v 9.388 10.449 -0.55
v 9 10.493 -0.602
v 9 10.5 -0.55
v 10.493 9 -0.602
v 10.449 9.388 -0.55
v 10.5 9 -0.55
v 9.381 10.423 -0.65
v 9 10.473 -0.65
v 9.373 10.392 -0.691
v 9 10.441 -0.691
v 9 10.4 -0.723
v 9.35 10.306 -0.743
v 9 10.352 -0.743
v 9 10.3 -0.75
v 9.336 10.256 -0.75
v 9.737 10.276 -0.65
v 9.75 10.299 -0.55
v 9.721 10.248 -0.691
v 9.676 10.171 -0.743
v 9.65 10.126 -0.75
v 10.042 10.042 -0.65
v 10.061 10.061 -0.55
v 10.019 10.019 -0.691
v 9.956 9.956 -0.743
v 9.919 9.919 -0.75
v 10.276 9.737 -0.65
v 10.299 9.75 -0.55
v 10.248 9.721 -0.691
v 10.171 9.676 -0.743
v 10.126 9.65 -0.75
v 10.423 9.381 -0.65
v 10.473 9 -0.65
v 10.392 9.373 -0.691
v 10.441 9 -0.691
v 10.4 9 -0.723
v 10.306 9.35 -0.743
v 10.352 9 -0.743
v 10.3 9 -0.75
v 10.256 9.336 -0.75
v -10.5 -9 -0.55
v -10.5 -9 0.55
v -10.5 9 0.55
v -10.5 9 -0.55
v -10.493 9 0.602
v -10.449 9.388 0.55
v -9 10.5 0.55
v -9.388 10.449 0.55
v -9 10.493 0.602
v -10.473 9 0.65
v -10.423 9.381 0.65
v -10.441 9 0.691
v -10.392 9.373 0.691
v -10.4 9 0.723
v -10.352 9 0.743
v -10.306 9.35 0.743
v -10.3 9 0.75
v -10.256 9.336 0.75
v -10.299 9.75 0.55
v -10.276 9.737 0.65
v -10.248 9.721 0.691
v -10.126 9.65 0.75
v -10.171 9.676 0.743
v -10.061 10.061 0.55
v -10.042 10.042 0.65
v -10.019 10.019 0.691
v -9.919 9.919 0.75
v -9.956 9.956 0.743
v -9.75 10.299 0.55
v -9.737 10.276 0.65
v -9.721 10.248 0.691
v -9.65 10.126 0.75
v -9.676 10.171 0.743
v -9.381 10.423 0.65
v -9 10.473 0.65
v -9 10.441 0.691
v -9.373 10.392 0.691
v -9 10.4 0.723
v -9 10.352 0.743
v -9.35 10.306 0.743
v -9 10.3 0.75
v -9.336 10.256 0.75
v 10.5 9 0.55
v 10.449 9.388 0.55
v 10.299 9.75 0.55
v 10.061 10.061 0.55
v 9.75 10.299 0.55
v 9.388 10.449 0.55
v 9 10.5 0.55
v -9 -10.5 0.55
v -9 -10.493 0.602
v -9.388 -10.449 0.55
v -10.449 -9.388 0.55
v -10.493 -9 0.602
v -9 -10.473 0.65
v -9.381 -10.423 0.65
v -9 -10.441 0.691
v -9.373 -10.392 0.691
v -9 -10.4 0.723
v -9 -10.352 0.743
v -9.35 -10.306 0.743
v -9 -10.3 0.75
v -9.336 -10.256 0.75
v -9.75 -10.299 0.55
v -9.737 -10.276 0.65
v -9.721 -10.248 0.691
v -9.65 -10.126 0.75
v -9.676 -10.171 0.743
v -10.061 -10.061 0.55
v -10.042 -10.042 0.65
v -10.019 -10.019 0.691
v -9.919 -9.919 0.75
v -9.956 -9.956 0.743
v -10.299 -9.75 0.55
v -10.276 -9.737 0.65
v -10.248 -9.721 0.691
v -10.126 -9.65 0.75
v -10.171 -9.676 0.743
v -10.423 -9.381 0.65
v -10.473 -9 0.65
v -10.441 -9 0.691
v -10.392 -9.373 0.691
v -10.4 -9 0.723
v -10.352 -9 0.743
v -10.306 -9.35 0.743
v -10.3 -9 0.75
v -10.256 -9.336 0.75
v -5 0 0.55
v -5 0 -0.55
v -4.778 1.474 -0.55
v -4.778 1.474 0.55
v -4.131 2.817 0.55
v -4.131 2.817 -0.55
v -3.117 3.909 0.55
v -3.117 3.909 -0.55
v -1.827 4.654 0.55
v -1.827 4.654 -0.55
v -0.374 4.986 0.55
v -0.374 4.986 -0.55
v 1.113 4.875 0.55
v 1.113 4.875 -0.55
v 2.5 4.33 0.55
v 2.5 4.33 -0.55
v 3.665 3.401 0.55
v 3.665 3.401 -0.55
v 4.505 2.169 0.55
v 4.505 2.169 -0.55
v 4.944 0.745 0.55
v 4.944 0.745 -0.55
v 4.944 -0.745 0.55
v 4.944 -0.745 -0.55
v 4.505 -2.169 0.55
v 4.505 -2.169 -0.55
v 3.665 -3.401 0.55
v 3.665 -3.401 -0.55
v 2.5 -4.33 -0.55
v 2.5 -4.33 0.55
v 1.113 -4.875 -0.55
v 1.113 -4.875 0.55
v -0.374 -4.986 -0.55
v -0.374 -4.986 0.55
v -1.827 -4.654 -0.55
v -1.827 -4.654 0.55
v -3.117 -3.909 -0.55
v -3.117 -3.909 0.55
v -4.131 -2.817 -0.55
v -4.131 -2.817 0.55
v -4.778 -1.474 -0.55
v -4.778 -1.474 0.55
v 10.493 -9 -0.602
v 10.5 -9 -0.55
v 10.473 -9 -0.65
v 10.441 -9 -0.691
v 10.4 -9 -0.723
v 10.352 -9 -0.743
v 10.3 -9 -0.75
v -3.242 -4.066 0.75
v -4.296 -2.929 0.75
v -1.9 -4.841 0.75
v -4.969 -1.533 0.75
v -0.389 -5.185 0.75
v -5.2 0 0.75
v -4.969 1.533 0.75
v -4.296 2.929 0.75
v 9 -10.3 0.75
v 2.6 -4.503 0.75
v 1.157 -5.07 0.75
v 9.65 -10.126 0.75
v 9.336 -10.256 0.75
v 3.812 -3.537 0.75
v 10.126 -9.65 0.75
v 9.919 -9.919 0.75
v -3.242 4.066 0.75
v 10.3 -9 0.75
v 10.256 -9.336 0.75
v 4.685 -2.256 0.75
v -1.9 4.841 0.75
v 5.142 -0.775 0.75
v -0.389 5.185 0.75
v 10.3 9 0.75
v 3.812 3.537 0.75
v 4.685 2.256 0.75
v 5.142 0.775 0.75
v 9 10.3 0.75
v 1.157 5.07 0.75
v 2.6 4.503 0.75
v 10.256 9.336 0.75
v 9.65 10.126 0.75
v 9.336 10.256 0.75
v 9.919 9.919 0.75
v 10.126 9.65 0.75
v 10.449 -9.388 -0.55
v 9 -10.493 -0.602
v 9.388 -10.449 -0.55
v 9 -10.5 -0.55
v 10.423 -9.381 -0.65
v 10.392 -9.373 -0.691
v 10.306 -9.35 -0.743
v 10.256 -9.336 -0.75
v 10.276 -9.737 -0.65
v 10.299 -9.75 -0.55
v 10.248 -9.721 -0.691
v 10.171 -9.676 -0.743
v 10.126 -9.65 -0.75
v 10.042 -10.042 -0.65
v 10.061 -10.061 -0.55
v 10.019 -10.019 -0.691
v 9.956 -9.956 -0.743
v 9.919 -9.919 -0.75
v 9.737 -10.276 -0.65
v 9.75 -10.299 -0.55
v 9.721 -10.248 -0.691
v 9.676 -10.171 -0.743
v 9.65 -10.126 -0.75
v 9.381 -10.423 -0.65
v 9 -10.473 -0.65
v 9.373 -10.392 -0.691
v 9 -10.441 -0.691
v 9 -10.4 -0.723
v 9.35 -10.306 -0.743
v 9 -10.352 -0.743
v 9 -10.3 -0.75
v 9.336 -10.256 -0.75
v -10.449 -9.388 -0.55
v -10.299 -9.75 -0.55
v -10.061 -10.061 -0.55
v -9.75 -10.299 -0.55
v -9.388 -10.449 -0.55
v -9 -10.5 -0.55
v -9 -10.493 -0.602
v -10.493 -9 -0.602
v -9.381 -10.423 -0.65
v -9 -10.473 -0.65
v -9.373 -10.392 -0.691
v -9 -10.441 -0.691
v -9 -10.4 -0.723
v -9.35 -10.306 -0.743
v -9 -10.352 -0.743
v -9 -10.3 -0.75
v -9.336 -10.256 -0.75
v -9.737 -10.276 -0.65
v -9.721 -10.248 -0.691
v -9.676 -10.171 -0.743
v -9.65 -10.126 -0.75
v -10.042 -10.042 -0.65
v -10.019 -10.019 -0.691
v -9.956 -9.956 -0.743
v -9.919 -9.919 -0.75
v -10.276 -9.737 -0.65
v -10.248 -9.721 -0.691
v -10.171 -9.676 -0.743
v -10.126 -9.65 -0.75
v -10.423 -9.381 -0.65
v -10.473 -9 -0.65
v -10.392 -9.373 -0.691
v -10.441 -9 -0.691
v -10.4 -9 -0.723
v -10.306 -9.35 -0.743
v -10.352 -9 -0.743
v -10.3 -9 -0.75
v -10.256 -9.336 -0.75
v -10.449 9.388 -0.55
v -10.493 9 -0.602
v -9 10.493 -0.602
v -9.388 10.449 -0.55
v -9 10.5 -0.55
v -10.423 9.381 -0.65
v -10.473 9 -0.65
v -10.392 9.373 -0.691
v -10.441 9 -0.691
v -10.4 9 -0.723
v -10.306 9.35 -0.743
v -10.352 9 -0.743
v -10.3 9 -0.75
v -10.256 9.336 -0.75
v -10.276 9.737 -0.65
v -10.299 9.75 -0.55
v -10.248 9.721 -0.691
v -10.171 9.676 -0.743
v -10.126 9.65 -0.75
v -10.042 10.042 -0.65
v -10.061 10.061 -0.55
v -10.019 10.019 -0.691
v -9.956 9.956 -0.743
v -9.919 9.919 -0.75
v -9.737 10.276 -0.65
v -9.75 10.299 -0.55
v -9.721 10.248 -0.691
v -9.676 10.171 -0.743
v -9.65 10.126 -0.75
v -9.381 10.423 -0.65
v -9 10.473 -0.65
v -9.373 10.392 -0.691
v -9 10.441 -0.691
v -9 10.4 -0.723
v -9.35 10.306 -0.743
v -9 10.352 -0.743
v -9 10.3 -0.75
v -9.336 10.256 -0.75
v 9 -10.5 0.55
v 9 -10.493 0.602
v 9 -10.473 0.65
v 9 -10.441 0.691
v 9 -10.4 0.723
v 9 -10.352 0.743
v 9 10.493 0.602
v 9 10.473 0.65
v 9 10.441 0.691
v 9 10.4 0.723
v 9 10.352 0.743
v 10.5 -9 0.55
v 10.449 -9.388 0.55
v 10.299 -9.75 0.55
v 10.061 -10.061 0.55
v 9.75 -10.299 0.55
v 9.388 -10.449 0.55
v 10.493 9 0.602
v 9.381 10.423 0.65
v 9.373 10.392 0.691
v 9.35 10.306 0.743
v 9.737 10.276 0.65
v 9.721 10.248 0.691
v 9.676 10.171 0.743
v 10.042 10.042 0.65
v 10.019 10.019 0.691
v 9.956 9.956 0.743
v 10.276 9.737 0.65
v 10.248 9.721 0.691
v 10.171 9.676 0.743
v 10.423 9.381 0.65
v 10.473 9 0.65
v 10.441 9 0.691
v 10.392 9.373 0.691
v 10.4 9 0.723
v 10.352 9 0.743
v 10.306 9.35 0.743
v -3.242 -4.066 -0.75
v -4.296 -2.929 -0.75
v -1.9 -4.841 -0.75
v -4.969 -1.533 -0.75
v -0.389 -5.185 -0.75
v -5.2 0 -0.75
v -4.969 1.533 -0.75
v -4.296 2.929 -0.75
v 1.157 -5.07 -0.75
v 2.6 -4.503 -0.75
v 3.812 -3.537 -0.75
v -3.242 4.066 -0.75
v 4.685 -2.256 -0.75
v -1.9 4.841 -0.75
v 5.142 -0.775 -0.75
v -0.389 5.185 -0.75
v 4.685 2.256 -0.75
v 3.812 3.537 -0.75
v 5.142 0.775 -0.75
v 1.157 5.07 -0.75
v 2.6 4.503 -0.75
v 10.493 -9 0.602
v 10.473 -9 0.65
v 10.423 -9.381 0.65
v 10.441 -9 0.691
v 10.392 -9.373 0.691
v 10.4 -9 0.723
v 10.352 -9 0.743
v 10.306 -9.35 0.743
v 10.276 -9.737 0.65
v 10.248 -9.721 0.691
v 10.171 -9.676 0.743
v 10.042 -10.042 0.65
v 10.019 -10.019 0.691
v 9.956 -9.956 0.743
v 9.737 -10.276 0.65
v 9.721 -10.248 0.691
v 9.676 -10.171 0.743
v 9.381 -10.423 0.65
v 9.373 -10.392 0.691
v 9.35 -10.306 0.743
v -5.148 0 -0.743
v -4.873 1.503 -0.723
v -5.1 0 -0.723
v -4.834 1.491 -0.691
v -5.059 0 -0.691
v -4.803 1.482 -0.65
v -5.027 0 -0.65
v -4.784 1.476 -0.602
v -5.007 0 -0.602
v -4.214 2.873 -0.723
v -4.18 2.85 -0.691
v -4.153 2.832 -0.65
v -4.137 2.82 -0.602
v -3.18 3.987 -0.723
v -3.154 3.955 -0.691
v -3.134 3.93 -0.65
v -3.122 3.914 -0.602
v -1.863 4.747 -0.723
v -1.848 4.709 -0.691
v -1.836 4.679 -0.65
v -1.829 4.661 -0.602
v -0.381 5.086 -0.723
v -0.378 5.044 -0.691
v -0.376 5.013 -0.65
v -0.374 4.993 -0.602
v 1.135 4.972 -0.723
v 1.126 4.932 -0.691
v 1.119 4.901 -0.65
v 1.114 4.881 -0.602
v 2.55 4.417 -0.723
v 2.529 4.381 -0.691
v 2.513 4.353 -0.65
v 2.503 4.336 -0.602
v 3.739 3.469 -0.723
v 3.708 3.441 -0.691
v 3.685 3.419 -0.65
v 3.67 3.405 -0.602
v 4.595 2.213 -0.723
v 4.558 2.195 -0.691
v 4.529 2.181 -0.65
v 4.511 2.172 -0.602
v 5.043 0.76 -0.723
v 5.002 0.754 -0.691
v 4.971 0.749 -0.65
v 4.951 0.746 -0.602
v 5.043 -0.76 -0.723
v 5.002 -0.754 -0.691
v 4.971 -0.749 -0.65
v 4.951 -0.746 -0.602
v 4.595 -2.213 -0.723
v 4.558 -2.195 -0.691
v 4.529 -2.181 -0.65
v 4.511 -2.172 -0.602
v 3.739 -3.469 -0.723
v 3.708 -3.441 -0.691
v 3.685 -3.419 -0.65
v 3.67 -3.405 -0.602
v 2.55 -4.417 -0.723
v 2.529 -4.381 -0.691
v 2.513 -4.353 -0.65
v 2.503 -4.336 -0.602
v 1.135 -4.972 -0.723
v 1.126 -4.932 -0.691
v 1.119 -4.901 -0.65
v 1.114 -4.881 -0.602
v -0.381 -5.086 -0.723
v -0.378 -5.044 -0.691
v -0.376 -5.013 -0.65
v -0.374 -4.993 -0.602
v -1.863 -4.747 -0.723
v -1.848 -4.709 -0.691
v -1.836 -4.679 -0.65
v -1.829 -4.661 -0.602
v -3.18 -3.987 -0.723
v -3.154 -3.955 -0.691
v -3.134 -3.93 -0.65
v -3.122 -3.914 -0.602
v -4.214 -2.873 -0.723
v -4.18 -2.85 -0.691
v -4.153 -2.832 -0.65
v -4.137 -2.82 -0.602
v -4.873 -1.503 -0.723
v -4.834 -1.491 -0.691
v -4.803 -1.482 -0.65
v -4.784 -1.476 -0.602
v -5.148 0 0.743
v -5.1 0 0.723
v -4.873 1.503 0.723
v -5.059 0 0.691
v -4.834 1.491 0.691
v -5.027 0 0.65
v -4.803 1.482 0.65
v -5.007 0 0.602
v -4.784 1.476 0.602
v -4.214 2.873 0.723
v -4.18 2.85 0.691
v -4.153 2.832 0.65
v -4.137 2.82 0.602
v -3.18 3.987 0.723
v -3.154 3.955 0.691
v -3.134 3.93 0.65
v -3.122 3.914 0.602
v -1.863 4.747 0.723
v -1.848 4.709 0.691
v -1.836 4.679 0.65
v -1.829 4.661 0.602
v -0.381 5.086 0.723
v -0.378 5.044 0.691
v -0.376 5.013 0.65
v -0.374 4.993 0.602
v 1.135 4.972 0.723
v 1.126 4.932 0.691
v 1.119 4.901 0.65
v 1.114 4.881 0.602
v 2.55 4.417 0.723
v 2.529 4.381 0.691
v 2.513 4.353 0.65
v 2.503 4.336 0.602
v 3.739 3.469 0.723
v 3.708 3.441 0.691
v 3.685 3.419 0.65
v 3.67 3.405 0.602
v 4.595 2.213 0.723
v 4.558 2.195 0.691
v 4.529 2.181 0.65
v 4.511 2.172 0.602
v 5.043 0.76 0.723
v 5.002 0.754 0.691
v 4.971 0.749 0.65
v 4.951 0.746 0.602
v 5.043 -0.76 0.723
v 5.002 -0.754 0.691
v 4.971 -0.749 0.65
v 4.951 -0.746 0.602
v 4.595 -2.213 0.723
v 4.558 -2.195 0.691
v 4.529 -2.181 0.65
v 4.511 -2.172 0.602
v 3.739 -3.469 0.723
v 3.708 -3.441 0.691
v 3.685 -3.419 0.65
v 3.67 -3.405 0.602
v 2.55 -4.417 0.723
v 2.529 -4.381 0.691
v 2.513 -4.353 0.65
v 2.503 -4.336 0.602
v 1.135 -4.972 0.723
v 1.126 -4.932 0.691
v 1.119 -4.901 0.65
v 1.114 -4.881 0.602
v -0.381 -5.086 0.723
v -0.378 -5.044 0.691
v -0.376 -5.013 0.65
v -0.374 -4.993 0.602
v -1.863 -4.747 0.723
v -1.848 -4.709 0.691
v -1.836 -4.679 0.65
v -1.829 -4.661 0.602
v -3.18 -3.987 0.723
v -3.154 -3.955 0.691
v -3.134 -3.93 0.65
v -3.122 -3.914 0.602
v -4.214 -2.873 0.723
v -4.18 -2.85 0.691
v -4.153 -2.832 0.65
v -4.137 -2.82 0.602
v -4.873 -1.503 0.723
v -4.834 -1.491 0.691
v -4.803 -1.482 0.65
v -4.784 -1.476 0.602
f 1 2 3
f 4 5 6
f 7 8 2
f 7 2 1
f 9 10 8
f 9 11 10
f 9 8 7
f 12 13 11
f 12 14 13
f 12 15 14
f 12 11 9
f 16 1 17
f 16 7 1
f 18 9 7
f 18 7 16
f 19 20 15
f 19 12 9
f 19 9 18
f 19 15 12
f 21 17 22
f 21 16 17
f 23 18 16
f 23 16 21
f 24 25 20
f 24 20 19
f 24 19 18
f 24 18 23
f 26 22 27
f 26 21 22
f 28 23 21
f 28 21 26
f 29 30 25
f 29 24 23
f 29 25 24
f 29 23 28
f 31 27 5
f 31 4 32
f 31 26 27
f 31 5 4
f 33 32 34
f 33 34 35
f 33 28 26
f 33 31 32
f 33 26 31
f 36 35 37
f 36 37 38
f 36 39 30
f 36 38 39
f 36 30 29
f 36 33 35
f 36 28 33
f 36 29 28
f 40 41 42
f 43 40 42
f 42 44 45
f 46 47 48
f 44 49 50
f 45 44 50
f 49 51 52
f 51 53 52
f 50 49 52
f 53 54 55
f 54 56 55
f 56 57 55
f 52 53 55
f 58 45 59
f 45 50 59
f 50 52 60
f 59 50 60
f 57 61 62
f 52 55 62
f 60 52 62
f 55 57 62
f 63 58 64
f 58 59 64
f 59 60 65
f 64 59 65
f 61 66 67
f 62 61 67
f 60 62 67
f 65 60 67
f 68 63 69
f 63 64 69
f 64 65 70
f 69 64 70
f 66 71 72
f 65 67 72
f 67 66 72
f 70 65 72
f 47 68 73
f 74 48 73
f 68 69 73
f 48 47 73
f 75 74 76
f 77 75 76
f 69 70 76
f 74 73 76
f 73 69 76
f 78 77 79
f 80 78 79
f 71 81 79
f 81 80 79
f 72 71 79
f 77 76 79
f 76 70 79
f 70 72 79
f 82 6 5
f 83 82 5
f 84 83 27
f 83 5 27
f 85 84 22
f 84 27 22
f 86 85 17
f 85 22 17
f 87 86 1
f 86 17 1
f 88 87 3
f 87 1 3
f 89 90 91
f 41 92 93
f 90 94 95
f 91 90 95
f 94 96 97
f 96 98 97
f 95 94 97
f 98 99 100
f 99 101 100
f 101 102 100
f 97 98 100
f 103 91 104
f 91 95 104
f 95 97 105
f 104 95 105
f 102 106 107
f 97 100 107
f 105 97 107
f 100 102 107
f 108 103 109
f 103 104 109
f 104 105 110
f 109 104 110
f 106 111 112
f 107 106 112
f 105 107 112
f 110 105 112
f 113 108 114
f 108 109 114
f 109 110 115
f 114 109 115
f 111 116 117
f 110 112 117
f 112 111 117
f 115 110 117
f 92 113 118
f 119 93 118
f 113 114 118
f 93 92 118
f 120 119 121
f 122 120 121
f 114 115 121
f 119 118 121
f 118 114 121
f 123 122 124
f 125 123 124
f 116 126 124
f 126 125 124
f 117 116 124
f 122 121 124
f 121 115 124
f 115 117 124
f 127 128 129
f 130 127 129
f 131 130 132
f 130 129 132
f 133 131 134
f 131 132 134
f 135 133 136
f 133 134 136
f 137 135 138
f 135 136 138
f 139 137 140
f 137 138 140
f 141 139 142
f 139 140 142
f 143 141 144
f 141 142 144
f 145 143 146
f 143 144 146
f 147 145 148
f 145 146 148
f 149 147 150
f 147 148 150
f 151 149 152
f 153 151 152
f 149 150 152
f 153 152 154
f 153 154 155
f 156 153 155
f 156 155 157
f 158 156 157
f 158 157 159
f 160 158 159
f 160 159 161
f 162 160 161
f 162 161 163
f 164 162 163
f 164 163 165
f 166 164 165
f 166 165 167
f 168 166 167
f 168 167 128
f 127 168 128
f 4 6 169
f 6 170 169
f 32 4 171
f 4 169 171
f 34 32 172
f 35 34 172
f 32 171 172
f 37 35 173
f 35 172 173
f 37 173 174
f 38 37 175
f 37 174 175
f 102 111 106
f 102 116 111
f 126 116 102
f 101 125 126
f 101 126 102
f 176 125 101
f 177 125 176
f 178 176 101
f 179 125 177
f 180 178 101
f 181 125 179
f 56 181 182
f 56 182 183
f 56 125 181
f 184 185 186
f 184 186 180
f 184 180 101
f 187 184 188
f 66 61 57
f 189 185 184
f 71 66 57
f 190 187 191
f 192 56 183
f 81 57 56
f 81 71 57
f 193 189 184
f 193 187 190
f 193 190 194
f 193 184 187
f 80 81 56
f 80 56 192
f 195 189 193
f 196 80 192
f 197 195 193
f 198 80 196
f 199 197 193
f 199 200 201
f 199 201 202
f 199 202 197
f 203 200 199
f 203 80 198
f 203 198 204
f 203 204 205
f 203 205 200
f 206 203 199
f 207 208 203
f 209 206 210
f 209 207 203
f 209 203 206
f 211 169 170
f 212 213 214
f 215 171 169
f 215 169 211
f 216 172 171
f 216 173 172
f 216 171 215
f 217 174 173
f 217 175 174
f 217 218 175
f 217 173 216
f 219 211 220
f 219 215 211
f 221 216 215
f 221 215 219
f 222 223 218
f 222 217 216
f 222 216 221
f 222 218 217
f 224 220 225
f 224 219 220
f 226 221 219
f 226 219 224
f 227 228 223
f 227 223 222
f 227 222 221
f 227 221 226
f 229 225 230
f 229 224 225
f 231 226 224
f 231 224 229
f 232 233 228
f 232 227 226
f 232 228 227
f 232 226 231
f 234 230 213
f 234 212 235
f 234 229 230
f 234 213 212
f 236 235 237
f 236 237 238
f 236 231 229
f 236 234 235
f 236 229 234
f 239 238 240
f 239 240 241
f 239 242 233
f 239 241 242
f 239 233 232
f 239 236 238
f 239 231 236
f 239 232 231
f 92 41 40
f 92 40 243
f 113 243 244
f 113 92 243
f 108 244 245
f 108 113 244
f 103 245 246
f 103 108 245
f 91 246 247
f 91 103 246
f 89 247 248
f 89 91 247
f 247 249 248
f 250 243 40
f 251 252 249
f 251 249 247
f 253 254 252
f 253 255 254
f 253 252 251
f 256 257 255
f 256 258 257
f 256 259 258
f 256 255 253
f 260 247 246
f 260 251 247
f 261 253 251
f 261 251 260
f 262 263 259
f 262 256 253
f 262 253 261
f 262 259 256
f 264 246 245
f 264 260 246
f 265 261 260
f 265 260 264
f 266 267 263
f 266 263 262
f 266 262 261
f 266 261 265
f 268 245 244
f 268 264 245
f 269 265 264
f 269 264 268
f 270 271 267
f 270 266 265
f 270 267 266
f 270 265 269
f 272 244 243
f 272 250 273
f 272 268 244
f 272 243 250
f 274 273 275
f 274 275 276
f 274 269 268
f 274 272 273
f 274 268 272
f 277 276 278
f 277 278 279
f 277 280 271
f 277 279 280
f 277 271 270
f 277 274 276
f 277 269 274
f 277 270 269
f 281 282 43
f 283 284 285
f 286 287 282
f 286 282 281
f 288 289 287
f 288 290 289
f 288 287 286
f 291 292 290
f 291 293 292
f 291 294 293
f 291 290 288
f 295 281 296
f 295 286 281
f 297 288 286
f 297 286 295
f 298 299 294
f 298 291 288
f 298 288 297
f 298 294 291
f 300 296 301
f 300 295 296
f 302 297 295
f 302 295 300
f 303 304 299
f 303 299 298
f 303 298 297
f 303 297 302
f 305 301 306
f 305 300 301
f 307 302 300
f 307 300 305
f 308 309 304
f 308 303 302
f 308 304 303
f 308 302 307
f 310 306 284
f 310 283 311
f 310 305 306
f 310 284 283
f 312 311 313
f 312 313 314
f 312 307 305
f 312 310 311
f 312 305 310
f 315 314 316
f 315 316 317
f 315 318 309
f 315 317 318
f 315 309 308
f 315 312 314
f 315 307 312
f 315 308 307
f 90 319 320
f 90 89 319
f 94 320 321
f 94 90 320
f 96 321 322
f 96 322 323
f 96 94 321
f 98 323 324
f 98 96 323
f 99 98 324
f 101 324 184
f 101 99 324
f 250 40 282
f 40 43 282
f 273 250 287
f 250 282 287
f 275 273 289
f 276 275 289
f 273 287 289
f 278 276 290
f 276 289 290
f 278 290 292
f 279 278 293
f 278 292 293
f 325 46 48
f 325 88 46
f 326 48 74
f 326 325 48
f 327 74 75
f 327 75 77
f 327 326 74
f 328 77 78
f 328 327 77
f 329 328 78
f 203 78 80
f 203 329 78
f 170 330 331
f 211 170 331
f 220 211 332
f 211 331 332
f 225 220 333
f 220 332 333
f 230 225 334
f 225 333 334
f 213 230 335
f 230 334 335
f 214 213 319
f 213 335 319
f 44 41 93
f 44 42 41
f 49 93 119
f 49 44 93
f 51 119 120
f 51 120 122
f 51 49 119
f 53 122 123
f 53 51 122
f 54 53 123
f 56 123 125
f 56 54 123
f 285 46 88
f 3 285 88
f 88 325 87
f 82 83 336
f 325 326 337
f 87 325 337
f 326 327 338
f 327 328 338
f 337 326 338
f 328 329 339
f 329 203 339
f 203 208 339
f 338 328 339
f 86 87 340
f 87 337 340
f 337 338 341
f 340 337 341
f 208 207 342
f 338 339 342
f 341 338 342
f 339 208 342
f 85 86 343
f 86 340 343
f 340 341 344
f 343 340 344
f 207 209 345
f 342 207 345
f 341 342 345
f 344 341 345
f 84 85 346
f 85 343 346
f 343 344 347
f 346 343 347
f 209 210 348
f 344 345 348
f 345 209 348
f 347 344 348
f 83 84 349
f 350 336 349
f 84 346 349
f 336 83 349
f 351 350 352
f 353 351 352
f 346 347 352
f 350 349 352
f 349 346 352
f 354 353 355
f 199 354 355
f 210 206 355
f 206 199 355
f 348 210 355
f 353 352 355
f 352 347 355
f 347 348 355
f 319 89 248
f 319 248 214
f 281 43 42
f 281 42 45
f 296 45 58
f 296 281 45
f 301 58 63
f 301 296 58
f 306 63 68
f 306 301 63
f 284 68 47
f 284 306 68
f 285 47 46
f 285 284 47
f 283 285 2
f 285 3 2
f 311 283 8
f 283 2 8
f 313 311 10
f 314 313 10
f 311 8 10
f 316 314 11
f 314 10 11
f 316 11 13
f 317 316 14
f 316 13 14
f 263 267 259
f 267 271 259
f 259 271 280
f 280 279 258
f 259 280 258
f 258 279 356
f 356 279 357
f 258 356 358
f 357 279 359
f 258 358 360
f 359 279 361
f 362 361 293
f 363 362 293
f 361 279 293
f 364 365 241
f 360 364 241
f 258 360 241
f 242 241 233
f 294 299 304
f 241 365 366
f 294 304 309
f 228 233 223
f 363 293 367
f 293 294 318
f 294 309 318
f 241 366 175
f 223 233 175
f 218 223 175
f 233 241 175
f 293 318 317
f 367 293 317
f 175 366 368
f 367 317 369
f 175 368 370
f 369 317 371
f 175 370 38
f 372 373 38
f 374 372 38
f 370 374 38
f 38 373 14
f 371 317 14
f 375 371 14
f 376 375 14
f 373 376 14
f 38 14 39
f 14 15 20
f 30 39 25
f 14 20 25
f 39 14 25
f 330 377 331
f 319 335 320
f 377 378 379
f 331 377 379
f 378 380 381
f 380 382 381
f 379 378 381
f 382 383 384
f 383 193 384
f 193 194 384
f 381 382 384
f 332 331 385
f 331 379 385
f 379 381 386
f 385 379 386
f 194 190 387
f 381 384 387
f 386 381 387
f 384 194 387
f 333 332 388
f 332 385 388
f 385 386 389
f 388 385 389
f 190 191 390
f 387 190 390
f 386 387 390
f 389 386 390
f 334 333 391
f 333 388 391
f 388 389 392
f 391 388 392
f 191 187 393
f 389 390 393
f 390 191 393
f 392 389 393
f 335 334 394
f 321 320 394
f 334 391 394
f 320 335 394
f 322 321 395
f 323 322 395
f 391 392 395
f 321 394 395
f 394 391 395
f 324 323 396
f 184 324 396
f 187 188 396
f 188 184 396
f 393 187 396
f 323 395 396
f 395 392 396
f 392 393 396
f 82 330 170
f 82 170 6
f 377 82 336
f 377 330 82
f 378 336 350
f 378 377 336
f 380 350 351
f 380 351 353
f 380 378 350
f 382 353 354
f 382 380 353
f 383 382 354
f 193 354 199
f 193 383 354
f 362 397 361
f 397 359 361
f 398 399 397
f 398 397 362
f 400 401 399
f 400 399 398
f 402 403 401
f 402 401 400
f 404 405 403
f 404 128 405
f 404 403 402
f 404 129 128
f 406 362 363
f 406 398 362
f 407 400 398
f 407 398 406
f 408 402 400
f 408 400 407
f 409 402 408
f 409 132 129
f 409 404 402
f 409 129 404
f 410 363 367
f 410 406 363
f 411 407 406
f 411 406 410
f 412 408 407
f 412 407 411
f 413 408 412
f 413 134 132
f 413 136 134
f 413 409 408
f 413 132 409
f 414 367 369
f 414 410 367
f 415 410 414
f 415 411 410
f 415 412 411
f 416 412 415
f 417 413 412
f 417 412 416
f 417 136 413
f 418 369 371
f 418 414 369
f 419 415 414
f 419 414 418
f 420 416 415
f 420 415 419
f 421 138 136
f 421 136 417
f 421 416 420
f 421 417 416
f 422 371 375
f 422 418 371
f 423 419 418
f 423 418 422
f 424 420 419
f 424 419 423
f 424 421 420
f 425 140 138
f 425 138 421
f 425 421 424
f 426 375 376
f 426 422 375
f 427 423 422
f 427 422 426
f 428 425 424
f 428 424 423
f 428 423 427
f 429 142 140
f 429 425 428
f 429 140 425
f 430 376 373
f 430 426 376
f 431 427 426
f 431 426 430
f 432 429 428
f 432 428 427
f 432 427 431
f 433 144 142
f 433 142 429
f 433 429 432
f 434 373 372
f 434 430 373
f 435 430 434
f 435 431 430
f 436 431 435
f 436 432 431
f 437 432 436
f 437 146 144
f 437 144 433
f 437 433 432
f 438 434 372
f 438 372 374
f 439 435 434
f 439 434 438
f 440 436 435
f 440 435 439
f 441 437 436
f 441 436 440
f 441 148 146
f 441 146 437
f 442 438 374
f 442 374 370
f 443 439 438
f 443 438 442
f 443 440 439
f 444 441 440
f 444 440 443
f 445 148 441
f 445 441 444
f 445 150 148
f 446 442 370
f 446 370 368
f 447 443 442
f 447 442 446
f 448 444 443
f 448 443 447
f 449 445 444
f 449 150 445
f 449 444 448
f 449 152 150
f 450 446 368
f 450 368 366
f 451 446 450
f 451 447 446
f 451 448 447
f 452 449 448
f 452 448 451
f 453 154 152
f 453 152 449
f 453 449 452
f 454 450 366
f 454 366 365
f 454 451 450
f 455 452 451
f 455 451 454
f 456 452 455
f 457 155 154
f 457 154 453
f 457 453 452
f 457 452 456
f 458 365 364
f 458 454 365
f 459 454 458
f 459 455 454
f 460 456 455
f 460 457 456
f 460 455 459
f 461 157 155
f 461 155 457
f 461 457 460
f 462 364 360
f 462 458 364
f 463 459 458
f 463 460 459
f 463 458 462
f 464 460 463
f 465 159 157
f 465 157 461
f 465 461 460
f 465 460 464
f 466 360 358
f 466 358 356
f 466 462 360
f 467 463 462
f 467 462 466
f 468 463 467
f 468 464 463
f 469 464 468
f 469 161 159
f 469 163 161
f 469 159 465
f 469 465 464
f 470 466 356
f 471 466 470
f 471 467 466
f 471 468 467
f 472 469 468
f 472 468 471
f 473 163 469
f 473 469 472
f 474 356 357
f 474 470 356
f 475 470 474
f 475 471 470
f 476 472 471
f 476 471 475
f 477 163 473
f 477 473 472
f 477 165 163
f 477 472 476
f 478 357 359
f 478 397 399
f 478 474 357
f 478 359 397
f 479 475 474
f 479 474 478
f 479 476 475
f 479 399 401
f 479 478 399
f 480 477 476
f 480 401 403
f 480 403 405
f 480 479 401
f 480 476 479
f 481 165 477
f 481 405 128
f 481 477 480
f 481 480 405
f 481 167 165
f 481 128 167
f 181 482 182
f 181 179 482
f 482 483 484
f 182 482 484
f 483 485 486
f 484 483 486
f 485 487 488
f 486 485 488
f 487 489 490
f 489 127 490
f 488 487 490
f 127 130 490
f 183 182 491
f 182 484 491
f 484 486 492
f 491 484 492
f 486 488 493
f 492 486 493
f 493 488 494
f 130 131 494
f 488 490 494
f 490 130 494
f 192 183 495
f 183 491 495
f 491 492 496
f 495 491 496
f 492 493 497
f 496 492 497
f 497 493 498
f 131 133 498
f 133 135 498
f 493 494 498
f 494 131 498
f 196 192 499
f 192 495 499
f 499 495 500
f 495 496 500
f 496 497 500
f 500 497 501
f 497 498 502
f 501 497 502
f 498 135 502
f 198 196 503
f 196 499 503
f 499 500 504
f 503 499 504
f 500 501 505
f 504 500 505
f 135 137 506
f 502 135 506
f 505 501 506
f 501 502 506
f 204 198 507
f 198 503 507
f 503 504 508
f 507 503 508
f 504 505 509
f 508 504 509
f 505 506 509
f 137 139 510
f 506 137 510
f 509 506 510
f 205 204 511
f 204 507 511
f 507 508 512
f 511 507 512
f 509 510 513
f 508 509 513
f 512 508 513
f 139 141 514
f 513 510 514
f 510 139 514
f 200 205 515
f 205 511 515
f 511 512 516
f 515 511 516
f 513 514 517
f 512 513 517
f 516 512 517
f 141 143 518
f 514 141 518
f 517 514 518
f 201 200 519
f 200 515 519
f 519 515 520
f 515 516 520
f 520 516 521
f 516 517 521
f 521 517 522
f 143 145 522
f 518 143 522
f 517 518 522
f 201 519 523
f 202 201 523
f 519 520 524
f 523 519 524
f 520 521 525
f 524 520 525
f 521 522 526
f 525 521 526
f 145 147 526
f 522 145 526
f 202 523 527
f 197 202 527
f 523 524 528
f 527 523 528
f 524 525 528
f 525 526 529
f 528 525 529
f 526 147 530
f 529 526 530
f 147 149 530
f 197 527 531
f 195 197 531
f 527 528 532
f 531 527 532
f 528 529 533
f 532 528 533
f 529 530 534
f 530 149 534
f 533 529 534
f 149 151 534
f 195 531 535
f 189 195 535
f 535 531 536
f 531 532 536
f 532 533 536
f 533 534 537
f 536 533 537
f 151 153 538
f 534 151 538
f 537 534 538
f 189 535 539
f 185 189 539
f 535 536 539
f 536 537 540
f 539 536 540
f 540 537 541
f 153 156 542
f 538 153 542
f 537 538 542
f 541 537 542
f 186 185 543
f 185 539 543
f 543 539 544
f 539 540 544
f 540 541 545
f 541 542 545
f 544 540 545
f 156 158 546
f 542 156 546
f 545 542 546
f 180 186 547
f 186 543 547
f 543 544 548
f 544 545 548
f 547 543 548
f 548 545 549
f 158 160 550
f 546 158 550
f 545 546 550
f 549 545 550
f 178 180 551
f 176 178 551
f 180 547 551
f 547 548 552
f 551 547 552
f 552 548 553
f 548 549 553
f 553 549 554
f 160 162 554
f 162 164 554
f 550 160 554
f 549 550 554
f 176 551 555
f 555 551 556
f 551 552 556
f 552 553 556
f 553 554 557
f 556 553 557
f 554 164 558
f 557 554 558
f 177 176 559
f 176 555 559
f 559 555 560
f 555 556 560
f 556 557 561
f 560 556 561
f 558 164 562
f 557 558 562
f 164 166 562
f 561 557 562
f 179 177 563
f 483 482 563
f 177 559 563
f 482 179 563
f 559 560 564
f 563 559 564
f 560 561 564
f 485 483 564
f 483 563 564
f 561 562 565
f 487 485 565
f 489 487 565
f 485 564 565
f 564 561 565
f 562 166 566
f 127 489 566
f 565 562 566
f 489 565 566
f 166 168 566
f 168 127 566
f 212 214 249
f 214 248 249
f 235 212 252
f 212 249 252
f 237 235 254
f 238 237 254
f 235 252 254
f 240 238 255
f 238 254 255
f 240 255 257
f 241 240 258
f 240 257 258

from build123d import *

# Parameters (mm, degrees)
SKETCH1_W           = 21
SKETCH1_H           = 21
BOSS_EXTRUDE1_DEPTH = 0.75
FILLET1_R           = 1.5
SKETCH2_R           = 5
CUT_EXTRUDE1_DEPTH  = 15.924811557
FILLET2_R           = 0.2


with BuildPart() as part:
    # Sketch1 → Boss-Extrude1 (new, symmetric)
    with BuildSketch(Plane.XY):
        Rectangle(SKETCH1_W, SKETCH1_H)
    extrude(amount=BOSS_EXTRUDE1_DEPTH, both=True)

    # Fillet1
    fillet1_edges = [part.edges().sort_by_distance(p)[0] for p in [
        (-10.5, 10.5, 0),
        (10.5, 10.5, 0),
        (10.5, -10.5, 0),
        (-10.5, -10.5, 0),
    ]]
    fillet(fillet1_edges, radius=FILLET1_R)

    # Sketch2 → Cut-Extrude1 (cut, through all)
    with BuildSketch(Plane(origin=(0, 0, -0.75), x_dir=(-1, 0, 0), z_dir=(0, 0, -1))):
        Circle(SKETCH2_R)
    extrude(amount=-CUT_EXTRUDE1_DEPTH, mode=Mode.SUBTRACT)

    # Fillet2
    fillet2_edges = [part.edges().sort_by_distance(p)[0] for p in [
        (-10.5, 0, -0.75),
        (-10.5, 0, 0.75),
        (0, 10.5, -0.75),
        (10.5, 0, -0.75),
        (0, -10.5, -0.75),
        (10.060660172, 10.060660172, -0.75),
        (-10.060660172, -10.060660172, -0.75),
        (10.060660172, -10.060660172, -0.75),
        (-10.060660172, 10.060660172, -0.75),
        (0, 10.5, 0.75),
        (0, -10.5, 0.75),
        (10.5, 0, 0.75),
        (10.060660172, 10.060660172, 0.75),
        (-10.060660172, -10.060660172, 0.75),
        (10.060660172, -10.060660172, 0.75),
        (-10.060660172, 10.060660172, 0.75),
        (5, 0, 0.75),
        (5, 0, -0.75),
    ]]
    fillet(fillet2_edges, radius=FILLET2_R)


solid = part.part
